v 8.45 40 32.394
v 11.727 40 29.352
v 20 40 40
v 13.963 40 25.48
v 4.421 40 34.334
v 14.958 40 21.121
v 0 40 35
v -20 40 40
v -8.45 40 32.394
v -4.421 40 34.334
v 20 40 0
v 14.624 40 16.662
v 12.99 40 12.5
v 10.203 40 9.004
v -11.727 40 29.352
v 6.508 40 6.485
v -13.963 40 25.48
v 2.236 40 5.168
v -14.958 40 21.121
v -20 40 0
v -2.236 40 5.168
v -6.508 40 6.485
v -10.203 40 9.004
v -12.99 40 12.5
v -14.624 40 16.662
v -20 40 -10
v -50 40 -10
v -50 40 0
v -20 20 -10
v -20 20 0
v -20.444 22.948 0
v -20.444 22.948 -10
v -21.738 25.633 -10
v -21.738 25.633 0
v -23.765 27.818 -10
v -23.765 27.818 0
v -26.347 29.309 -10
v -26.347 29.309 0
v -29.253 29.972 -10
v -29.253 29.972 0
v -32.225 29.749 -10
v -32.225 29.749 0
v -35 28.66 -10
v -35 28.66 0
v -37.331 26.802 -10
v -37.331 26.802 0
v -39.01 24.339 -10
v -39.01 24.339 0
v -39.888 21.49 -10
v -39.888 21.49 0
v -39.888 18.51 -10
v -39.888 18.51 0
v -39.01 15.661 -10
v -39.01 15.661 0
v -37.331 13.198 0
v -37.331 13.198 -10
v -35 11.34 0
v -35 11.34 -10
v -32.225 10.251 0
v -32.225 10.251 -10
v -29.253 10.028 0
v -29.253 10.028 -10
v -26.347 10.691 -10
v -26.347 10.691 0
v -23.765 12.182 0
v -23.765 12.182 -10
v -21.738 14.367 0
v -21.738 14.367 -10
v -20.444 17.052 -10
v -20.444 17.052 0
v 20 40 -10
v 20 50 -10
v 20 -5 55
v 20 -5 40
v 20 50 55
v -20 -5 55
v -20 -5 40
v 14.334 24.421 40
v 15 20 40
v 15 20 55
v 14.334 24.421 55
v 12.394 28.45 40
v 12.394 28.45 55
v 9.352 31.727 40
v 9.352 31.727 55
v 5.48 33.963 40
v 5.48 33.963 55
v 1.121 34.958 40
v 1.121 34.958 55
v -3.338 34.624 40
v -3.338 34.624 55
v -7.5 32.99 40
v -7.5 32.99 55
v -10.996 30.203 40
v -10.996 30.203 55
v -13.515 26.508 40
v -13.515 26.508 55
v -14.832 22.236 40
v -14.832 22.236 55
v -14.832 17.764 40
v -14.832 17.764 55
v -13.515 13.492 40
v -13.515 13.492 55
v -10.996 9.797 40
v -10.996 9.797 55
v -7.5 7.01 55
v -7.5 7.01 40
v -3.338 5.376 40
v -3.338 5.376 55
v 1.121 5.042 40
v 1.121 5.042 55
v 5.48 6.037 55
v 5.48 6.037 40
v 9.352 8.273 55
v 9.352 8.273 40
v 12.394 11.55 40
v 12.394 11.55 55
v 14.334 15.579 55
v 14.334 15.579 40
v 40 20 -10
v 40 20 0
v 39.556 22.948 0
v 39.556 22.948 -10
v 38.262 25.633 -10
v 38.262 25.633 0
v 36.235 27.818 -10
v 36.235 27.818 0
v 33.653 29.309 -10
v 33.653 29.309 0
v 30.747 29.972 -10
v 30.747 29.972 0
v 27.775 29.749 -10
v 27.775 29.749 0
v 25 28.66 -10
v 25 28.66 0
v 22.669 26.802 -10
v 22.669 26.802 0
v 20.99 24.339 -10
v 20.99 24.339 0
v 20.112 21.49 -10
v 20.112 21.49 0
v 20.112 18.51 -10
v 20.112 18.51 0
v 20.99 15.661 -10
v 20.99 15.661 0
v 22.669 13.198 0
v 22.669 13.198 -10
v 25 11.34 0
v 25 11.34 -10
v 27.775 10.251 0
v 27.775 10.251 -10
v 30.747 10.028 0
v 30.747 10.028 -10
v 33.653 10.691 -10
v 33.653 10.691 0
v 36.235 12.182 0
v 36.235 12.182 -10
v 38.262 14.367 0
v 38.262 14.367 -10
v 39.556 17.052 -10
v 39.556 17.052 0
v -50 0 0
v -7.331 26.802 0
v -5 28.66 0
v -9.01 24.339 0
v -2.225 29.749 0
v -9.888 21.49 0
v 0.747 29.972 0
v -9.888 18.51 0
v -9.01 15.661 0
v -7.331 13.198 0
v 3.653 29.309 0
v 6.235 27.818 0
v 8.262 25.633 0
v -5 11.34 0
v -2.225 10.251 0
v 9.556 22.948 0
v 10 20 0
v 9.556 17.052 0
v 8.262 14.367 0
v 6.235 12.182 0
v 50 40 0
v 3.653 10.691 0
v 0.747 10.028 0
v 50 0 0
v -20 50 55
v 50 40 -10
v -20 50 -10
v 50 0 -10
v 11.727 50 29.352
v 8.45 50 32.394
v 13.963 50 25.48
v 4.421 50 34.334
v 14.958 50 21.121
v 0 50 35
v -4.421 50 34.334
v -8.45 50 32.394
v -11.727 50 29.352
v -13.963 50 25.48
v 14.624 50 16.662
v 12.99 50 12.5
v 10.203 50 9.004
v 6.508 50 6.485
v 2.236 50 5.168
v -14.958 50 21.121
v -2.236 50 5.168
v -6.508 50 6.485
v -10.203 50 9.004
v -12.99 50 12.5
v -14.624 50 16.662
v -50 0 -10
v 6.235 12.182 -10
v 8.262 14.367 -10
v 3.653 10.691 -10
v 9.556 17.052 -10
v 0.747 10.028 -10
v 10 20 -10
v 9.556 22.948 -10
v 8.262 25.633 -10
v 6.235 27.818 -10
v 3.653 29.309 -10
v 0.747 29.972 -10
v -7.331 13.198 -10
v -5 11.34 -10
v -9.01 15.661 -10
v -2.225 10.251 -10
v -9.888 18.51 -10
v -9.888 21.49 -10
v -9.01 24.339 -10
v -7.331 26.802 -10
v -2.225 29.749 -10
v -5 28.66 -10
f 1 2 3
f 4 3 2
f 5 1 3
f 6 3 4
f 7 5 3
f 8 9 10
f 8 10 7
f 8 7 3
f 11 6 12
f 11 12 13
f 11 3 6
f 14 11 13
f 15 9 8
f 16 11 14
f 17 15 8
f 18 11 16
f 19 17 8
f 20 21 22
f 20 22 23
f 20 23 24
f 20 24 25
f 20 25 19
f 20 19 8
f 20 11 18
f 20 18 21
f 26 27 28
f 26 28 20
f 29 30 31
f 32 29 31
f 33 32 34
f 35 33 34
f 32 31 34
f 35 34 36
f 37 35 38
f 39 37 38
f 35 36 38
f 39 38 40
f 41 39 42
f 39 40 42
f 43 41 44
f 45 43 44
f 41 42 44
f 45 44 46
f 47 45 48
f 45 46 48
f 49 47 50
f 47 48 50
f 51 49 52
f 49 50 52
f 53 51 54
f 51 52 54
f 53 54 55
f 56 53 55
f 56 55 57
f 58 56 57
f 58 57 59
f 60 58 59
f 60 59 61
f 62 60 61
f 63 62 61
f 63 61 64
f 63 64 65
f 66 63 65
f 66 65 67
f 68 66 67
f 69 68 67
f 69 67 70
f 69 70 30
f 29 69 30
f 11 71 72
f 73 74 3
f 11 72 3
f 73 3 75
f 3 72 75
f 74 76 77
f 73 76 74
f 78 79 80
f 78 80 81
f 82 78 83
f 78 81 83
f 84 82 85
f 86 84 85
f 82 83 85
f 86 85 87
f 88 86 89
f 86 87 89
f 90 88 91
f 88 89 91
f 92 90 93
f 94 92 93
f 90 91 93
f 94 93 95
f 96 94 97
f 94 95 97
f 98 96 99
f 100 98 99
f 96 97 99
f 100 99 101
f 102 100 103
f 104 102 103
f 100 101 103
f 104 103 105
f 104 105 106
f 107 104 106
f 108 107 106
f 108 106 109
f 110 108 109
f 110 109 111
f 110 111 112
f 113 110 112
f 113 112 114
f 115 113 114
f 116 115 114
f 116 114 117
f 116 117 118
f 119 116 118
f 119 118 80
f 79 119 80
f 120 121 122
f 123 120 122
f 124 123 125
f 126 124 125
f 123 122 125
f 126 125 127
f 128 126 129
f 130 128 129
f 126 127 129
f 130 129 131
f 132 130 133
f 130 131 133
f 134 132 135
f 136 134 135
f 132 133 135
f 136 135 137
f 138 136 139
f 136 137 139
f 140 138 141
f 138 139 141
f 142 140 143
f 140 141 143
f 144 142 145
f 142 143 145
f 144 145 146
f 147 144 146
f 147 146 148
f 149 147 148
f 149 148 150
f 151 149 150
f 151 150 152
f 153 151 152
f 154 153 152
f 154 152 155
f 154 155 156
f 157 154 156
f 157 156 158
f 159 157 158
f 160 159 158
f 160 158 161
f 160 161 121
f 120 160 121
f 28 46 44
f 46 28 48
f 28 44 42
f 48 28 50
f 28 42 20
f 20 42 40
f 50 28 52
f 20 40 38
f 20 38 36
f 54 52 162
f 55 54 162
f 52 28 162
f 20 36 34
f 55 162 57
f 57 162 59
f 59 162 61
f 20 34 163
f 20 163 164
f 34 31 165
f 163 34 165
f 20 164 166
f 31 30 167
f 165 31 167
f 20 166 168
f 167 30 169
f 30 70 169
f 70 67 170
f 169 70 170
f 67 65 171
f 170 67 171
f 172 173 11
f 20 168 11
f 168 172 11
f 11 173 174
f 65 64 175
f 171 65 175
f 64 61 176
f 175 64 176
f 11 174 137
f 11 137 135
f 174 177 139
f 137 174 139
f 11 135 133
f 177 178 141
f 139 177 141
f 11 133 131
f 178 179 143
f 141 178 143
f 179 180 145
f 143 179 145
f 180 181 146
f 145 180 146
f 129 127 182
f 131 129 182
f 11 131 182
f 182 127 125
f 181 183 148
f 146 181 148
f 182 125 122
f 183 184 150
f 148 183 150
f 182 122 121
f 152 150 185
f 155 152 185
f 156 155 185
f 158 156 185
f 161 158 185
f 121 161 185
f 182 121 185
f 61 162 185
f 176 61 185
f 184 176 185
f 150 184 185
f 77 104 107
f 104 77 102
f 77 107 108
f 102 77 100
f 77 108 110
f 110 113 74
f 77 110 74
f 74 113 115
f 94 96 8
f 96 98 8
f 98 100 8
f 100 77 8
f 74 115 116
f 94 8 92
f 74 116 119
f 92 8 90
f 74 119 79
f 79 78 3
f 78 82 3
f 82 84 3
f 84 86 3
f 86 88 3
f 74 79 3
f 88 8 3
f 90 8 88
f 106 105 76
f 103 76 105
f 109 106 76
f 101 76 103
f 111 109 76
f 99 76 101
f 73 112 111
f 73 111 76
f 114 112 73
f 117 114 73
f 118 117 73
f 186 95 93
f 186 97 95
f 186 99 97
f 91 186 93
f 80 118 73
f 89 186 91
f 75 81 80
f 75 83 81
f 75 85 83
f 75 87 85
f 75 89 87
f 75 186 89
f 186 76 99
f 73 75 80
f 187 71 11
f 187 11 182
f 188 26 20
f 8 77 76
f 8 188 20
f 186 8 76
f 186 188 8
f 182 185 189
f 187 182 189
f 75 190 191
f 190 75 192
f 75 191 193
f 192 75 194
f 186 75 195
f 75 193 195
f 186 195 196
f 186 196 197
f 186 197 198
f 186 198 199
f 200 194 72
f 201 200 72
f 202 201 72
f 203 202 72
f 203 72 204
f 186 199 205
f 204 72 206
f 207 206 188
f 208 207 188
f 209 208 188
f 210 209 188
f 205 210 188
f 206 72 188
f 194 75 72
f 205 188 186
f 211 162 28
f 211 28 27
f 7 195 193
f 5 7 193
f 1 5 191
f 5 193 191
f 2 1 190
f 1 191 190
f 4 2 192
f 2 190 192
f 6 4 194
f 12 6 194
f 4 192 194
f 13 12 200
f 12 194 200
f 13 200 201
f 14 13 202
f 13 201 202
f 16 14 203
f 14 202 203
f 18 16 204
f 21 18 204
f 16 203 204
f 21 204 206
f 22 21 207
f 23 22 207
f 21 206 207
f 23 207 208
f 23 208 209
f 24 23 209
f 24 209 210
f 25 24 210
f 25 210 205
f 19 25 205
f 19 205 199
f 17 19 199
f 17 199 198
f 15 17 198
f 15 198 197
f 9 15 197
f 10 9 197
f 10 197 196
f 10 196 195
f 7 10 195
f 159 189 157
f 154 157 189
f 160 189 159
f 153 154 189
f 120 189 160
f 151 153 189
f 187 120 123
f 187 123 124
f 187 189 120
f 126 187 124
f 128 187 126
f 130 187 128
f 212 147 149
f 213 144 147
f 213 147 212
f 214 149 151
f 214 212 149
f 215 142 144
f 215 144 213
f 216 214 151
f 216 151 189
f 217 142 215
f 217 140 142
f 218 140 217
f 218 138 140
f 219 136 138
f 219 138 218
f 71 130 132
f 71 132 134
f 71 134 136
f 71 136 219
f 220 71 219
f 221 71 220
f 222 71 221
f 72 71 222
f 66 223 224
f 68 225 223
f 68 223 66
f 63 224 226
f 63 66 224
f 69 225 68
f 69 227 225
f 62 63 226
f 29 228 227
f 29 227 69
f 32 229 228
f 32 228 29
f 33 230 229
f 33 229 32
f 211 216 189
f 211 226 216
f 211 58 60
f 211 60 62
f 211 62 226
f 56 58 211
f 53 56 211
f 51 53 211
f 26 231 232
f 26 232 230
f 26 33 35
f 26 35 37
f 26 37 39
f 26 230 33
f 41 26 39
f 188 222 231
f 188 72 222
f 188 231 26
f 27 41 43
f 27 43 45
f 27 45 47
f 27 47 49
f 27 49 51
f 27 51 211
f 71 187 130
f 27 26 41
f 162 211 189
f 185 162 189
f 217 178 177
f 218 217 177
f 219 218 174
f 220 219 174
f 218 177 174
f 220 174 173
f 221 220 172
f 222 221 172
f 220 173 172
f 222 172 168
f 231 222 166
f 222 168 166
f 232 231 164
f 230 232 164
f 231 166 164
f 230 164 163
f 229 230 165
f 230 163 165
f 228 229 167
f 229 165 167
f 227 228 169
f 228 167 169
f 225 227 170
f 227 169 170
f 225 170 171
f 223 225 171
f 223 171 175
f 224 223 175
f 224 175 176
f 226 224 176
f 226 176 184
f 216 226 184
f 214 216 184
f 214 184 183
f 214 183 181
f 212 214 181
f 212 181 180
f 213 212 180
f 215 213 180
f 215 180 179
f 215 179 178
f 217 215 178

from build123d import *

# Parameters (mm, degrees)
ESBO_O1_W                = 100
ESBO_O1_H                = 10
RESSALTO_EXTRUS_O1_DEPTH = 40
ESBO_O3_W                = 40
ESBO_O3_H                = 10
RESSALTO_EXTRUS_O2_DEPTH = 65
ESBO_O4_W                = 40
ESBO_O4_H                = 15
RESSALTO_EXTRUS_O3_DEPTH = 45
ESBO_O5_R                = 10
CORTE_EXTRUS_O1_DEPTH    = 90.582364336
ESBO_O7_R                = 15
CORTE_EXTRUS_O3_DEPTH    = 45
ESBO_O6_R                = 15
CORTE_EXTRUS_O4_DEPTH    = 21


with BuildPart() as part:
    # Esboço1 → Ressalto-extrusão1 (new body)
    with BuildSketch(Plane(origin=(0, 0, 0), x_dir=(1, 0, 0), z_dir=(0, 1, 0))):
        with Locations((0, 5)):
            Rectangle(ESBO_O1_W, ESBO_O1_H)
    extrude(amount=RESSALTO_EXTRUS_O1_DEPTH)

    # Esboço3 → Ressalto-extrusão2 (add)
    with BuildSketch(Plane(origin=(0, 0, -10), x_dir=(-1, 0, 0), z_dir=(0, 0, -1))):
        with Locations((0, 45)):
            Rectangle(ESBO_O3_W, ESBO_O3_H)
    extrude(amount=-RESSALTO_EXTRUS_O2_DEPTH)

    # Esboço4 → Ressalto-extrusão3 (add)
    with BuildSketch(Plane.XZ.offset(-40)):
        with Locations((0, 47.5)):
            Rectangle(ESBO_O4_W, ESBO_O4_H)
    extrude(amount=RESSALTO_EXTRUS_O3_DEPTH)

    # Esboço5 → Corte-extrusão1 (cut, through all)
    with BuildSketch(Plane.XY):
        with Locations((-30, 20)):
            Circle(ESBO_O5_R)
        with Locations((30, 20)):
            Circle(ESBO_O5_R)
        with Locations((0, 20)):
            Circle(ESBO_O5_R)
    extrude(amount=-CORTE_EXTRUS_O1_DEPTH, mode=Mode.SUBTRACT)

    # Esboço7 → Corte-extrusão3 (cut)
    with BuildSketch(Plane(origin=(0, 50, 0), x_dir=(1, 0, 0), z_dir=(0, 1, 0))):
        with Locations(Location((0, -20, 0), (0, 0, 270))):
            Circle(ESBO_O7_R)
    extrude(amount=-CORTE_EXTRUS_O3_DEPTH, mode=Mode.SUBTRACT)

    # Esboço6 → Corte-extrusão4 (cut)
    with BuildSketch(Plane.XY.offset(55)):
        with Locations((0, 20)):
            Circle(ESBO_O6_R)
    extrude(amount=-CORTE_EXTRUS_O4_DEPTH, mode=Mode.SUBTRACT)


solid = part.part
